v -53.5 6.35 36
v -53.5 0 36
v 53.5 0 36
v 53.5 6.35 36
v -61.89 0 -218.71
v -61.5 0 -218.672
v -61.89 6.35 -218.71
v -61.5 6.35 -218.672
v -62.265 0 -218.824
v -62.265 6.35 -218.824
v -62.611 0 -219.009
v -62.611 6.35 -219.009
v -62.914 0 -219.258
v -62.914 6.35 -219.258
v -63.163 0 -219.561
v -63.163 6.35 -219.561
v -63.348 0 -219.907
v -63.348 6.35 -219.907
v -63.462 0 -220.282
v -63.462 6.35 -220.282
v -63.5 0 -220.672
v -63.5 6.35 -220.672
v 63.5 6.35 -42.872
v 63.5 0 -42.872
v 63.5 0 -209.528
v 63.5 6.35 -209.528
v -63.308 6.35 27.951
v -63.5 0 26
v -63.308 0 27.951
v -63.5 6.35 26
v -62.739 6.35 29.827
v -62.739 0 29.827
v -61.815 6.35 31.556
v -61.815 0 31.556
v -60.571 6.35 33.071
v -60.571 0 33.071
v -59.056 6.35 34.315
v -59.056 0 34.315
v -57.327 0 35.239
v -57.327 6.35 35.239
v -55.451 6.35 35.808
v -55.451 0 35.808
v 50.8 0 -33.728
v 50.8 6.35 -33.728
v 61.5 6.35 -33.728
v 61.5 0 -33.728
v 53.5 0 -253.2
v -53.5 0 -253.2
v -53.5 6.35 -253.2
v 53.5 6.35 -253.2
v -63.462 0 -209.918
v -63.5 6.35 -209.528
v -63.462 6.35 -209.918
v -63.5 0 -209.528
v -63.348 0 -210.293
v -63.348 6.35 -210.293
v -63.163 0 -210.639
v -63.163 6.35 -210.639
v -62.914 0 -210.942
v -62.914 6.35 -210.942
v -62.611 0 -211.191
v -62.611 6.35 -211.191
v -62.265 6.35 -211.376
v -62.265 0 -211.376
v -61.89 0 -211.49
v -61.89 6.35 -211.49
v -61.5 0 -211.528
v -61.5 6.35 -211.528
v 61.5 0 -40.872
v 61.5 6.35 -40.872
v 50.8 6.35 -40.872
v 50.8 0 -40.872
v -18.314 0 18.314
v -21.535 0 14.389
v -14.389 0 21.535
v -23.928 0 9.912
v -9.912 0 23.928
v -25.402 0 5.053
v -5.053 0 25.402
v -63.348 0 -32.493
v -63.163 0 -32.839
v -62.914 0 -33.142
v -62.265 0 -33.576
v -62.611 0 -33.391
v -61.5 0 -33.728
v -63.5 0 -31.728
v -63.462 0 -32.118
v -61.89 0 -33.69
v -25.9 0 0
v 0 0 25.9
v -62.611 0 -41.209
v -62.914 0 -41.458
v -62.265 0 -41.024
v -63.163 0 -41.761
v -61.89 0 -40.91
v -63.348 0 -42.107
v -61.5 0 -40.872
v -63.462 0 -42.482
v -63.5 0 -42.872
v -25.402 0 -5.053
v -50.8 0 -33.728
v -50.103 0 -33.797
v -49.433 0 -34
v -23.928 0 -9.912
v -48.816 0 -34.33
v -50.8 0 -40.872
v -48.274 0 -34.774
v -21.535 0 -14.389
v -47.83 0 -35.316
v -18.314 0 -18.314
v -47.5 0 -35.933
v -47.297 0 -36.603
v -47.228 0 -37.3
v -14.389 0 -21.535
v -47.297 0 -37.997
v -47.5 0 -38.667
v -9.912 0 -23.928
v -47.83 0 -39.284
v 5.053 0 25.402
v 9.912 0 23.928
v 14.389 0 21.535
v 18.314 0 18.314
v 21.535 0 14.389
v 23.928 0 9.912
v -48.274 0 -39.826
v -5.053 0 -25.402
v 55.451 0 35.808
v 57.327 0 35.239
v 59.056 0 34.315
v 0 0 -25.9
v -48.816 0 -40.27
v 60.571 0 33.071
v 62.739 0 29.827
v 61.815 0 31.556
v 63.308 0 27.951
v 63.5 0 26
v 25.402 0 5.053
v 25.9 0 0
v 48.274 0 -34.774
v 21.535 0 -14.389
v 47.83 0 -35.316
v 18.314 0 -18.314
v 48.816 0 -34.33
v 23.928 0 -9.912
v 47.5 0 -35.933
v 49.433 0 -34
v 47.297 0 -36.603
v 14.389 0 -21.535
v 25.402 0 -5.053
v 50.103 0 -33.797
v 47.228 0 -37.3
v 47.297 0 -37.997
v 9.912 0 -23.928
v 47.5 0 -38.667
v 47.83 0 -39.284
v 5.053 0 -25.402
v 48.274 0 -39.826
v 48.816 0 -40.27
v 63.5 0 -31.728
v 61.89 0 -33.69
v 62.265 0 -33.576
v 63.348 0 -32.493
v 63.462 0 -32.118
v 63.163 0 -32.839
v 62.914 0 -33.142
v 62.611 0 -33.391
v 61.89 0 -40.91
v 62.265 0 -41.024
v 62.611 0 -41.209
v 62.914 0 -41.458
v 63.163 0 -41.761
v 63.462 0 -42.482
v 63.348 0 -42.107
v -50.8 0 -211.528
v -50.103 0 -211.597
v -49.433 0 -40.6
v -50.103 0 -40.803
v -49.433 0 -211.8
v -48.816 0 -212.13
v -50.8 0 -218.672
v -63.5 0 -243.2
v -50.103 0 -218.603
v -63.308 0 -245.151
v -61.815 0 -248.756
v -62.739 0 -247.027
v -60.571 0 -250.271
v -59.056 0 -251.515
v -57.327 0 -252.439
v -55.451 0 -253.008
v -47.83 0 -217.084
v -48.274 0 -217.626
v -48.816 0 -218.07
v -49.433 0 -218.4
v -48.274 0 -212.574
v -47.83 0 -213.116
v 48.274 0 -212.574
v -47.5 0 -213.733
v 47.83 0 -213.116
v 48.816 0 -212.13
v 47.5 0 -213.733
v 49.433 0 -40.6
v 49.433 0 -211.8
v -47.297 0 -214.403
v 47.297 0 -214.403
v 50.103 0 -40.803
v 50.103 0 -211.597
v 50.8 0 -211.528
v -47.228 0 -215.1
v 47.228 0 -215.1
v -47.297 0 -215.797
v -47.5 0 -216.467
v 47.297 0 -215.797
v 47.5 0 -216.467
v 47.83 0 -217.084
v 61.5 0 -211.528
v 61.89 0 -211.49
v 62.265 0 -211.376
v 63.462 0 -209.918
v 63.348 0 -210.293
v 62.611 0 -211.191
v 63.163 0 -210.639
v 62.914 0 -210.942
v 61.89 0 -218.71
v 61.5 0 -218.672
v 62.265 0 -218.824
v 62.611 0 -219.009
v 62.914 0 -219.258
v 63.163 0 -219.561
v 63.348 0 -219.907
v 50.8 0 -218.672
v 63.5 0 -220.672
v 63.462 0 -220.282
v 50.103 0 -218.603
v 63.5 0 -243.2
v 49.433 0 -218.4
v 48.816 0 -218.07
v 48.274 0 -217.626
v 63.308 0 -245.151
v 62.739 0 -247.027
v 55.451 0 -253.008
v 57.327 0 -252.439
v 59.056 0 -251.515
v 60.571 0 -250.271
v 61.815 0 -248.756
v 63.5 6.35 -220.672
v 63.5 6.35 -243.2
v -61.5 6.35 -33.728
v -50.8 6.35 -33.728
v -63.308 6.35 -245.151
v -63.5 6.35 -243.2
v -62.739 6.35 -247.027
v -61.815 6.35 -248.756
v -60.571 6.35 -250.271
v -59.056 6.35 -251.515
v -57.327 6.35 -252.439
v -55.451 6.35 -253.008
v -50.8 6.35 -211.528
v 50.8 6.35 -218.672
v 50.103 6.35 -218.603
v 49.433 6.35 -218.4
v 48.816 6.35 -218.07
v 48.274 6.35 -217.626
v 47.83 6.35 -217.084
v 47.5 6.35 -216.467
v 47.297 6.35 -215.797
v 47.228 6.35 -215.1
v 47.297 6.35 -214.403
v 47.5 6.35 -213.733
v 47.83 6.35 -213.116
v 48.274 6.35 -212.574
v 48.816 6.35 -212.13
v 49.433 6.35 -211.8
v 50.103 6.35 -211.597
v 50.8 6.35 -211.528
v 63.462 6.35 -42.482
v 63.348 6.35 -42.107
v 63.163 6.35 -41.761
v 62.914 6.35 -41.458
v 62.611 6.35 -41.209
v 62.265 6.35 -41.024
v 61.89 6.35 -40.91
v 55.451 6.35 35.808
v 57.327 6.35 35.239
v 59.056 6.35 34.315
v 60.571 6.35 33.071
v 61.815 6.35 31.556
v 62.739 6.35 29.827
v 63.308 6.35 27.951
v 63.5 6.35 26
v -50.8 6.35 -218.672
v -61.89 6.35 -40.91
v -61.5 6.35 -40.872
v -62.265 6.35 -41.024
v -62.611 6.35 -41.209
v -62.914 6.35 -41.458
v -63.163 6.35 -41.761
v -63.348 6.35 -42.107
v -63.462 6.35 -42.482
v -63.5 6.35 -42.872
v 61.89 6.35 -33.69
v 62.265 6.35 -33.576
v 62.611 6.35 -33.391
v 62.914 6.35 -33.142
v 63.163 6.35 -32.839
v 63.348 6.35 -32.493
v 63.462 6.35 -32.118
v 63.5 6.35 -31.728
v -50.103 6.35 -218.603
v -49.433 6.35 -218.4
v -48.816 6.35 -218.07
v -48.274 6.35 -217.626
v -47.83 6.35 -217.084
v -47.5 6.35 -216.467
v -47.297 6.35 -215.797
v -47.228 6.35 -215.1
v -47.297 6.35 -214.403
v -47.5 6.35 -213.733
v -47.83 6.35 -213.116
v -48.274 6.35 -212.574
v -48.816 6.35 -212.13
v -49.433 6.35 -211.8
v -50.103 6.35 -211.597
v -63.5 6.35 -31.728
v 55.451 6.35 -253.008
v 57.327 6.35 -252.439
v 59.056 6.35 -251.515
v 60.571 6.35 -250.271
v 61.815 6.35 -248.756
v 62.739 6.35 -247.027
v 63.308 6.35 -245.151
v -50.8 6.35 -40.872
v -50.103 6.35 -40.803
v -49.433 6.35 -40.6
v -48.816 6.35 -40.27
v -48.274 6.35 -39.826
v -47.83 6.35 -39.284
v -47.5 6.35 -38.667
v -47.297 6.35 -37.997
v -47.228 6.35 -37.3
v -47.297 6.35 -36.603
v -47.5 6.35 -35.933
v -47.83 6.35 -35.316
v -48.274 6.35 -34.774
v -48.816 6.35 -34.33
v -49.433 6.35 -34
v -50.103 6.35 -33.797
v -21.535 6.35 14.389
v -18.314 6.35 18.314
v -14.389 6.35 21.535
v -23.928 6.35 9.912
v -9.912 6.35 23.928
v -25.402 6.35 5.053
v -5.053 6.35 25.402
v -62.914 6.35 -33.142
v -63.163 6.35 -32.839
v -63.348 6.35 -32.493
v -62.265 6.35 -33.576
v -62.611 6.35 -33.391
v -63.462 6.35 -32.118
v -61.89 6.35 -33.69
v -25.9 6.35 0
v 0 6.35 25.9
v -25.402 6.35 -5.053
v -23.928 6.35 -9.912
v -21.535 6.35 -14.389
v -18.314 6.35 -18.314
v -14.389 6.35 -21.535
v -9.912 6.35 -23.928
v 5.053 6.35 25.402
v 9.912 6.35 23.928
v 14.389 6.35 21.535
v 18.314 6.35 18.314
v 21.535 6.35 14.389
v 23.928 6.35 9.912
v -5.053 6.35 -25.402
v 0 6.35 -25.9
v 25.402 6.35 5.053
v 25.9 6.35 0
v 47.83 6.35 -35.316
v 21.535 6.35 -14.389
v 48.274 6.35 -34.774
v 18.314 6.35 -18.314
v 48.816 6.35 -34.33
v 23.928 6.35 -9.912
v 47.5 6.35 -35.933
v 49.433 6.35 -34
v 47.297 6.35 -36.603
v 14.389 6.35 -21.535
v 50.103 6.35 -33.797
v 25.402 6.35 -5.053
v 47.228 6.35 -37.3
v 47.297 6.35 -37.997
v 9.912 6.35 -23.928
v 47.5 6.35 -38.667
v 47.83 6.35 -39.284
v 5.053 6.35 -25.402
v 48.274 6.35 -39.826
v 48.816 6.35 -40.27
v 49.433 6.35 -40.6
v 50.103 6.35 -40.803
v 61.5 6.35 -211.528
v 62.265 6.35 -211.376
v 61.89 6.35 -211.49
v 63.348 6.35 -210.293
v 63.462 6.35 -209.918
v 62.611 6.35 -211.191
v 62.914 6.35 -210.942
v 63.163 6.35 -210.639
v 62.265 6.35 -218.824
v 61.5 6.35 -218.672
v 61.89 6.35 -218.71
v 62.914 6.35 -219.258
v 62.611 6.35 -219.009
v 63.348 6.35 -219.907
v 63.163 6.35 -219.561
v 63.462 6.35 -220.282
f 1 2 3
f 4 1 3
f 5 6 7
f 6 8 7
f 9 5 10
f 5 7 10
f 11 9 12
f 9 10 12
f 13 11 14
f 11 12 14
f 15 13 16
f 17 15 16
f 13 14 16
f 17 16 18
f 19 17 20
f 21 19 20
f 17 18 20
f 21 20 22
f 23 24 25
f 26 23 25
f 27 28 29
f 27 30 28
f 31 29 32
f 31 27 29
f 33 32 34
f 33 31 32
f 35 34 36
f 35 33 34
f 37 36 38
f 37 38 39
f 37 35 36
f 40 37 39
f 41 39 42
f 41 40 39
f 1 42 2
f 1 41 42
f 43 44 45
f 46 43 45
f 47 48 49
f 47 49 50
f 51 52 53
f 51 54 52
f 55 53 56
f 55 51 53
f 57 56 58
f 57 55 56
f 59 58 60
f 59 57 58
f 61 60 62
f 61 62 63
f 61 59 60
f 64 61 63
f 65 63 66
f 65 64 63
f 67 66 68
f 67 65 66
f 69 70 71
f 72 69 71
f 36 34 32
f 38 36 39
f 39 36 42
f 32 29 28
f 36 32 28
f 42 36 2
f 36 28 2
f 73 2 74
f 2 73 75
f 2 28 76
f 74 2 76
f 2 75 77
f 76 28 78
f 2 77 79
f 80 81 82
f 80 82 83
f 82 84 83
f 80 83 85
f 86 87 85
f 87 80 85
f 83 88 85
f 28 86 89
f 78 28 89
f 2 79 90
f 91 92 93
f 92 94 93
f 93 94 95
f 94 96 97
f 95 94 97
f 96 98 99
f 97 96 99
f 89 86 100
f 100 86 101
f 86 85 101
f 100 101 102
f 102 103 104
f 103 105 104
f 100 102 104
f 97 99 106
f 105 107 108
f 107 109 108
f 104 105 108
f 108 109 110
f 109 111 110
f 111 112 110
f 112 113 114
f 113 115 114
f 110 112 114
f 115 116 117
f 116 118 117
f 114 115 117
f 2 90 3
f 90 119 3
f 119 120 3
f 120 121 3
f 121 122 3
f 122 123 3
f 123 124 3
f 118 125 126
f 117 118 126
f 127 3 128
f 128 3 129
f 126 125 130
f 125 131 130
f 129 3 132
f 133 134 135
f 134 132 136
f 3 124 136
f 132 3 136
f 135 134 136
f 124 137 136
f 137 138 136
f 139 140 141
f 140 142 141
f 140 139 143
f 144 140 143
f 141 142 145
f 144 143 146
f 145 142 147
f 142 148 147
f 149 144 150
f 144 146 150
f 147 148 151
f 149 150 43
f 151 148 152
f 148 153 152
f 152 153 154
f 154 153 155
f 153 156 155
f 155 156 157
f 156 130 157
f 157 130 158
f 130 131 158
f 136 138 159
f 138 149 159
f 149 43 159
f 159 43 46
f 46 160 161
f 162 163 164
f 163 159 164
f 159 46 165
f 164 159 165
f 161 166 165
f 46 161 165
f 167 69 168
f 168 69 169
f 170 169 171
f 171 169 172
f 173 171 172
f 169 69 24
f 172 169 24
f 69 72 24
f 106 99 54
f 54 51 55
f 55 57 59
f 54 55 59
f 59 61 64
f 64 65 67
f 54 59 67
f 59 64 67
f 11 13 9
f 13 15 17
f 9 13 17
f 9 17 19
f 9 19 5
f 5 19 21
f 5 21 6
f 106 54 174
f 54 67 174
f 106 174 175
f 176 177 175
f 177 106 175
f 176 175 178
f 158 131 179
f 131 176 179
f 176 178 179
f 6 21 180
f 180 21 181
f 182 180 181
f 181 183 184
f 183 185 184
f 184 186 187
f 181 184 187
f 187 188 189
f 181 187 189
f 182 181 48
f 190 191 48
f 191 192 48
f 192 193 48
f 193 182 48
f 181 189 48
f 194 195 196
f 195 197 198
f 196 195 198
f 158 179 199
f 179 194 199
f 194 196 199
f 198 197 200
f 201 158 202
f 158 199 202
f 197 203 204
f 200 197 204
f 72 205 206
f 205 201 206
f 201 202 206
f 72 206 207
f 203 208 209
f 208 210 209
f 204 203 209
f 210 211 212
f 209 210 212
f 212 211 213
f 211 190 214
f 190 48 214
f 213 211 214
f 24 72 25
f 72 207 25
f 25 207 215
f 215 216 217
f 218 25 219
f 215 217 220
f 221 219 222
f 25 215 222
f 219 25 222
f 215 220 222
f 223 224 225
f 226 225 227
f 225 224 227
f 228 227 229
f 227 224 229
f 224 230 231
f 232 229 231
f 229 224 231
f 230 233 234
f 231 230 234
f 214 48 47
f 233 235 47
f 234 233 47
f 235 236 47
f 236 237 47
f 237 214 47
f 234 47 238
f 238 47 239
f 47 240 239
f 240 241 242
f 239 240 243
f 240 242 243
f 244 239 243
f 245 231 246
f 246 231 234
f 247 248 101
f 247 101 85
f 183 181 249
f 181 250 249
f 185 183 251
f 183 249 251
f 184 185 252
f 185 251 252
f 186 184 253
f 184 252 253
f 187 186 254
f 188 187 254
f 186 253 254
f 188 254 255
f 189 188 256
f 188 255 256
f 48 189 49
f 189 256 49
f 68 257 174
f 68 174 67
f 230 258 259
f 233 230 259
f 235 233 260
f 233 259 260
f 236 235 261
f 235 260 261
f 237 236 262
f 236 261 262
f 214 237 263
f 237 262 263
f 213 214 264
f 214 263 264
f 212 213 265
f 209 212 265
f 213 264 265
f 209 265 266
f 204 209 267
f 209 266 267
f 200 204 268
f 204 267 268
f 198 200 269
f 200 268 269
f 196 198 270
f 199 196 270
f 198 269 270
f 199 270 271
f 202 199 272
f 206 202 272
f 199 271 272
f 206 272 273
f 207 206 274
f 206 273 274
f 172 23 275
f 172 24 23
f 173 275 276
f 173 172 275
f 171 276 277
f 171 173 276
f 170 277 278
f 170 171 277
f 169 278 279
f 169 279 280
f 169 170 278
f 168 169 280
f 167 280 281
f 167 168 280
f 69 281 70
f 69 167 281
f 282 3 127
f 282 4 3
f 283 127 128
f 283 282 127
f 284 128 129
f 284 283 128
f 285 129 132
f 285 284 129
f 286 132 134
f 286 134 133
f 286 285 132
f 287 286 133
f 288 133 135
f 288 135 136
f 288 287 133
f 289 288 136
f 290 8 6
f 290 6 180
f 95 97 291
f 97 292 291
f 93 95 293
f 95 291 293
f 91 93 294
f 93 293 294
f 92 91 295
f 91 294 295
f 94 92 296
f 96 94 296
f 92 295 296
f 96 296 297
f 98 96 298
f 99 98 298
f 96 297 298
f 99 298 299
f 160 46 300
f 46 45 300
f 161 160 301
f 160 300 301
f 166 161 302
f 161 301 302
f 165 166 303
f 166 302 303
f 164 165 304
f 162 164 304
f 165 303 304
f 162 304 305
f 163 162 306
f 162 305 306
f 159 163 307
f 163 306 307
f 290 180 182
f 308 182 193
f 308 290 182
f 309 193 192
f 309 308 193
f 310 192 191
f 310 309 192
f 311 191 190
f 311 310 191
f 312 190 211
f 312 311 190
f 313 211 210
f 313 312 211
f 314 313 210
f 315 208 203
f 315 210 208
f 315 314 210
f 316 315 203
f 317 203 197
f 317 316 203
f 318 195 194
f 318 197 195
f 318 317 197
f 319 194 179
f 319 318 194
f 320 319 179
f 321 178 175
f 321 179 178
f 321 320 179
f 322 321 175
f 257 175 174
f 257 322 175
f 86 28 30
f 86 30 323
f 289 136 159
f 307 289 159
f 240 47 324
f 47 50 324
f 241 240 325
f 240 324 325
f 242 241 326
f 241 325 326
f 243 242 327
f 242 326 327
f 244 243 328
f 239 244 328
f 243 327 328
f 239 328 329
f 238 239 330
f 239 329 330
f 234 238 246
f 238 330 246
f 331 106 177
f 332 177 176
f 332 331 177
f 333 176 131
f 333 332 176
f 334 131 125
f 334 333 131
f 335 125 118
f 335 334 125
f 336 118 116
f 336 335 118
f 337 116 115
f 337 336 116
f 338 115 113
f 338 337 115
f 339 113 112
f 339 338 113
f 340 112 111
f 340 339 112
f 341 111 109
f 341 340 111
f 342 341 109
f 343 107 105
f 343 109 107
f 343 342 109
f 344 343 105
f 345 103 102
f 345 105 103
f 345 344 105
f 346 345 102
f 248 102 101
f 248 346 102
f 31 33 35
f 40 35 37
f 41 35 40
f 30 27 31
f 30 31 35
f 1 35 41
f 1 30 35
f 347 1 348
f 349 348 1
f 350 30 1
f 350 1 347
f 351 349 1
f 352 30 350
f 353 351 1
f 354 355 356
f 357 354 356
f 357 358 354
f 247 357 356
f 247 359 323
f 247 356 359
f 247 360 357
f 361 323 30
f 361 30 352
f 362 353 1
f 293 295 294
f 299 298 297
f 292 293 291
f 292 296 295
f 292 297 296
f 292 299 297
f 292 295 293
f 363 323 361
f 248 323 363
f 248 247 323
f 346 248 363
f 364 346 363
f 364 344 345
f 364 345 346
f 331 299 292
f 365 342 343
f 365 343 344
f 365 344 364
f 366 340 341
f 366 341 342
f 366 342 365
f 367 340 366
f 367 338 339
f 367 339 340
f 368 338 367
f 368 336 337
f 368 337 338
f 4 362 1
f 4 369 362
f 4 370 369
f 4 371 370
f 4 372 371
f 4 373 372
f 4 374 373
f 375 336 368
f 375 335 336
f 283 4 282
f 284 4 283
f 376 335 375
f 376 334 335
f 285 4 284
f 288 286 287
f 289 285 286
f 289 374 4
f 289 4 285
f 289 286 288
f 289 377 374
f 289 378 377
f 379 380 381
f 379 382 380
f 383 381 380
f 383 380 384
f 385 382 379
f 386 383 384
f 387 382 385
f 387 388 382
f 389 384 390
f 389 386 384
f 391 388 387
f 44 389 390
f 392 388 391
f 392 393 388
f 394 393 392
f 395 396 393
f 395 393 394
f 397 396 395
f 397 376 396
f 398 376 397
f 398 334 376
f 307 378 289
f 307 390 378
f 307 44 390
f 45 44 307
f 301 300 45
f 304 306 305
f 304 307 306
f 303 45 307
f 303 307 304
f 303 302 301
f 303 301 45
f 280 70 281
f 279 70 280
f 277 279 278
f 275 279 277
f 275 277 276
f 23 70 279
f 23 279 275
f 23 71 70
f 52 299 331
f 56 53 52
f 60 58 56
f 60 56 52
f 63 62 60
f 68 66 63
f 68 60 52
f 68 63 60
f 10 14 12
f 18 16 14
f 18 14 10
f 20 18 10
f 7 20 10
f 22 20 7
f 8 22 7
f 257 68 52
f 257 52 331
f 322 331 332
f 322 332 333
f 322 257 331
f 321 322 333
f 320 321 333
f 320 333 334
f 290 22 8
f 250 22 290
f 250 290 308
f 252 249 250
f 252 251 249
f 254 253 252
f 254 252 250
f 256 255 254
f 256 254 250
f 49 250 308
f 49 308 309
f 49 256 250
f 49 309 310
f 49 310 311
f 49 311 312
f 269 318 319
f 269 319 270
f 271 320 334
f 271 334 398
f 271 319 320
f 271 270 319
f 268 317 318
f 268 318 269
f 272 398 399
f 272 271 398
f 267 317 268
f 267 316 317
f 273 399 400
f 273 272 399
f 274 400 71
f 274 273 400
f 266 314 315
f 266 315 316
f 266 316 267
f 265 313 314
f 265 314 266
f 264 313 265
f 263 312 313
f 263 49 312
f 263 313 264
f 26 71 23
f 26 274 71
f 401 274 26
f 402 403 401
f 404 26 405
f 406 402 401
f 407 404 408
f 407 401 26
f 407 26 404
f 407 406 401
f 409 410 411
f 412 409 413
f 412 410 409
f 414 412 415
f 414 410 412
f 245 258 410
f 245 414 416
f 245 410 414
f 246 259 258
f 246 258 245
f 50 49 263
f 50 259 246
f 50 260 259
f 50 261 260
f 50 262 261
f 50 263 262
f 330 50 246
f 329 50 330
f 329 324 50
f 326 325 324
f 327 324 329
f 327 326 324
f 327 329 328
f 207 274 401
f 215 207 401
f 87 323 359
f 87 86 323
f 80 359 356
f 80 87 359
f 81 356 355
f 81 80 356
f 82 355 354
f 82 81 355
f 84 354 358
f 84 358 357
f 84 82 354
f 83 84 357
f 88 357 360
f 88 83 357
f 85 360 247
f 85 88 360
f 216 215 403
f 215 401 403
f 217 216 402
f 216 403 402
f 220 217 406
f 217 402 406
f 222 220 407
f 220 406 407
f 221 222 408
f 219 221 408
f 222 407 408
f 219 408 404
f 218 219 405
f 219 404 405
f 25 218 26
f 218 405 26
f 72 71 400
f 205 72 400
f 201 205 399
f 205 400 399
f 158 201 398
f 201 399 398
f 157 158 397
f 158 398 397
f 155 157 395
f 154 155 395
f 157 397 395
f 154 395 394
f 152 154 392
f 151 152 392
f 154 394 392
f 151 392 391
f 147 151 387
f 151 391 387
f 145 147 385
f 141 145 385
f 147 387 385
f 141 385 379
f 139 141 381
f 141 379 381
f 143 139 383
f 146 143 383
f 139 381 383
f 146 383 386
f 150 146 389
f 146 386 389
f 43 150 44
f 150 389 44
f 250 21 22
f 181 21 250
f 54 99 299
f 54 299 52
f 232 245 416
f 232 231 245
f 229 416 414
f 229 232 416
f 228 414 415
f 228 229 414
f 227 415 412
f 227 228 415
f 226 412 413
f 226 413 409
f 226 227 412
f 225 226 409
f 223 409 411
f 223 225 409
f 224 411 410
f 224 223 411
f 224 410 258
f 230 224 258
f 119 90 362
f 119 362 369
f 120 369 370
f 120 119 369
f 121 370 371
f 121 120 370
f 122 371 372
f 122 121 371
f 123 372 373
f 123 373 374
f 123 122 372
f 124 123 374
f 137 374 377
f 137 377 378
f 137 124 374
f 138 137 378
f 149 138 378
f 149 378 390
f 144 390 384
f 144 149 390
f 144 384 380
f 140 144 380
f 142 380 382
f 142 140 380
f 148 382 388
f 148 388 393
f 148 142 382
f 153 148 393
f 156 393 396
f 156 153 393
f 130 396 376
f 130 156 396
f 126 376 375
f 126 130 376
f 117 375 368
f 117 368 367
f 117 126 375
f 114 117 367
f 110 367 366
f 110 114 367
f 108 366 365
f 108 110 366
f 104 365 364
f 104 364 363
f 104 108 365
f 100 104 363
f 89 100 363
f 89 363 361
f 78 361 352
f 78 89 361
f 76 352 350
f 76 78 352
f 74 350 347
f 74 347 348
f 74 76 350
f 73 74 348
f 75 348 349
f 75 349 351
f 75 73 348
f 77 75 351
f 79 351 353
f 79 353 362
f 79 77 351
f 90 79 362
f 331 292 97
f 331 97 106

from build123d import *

# Parameters (mm, degrees)
SKETCH1_W           = 127
SKETCH1_H           = 289.2
SKETCH1_R           = 25.9
BOSS_EXTRUDE1_DEPTH = 6.35
CUT_EXTRUDE1_DEPTH  = 7.35
FILLET1_R           = 2
FILLET2_R           = 10


with BuildPart() as part:
    # Sketch1 → Boss-Extrude1 (new body)
    with BuildSketch(Plane(origin=(0, 0, 0), x_dir=(1, 0, 0), z_dir=(0, 1, 0))):
        with Locations((0, 108.6)):
            Rectangle(SKETCH1_W, SKETCH1_H)
        with Locations(Location((0, 0, 0), (0, 0, 270))):  # turned: the seam where the file's is
            Circle(SKETCH1_R, mode=Mode.SUBTRACT)
    extrude(amount=BOSS_EXTRUDE1_DEPTH)

    # Sketch3 → Cut-Extrude1 (cut, through all)
    with BuildSketch(Plane(origin=(0, 6.35, 0), x_dir=(1, 0, 0), z_dir=(0, 1, 0))):
        with BuildLine():
            Line((-76.2, 218.671875), (-50.8, 218.671875))
            ThreePointArc((-50.8, 218.671875), (-47.228125, 215.1), (-50.8, 211.528125))
            Line((-50.8, 211.528125), (-76.2, 211.528125))
            ThreePointArc((-76.2, 211.528125), (-79.771875, 215.1), (-76.2, 218.671875))
        make_face()
        with BuildLine():
            Line((-76.2, 40.871875), (-50.8, 40.871875))
            ThreePointArc((-50.8, 40.871875), (-47.228125, 37.3), (-50.8, 33.728125))
            Line((-50.8, 33.728125), (-76.2, 33.728125))
            ThreePointArc((-76.2, 33.728125), (-79.771875, 37.3), (-76.2, 40.871875))
        make_face()
    cut_extrude1 = extrude(amount=-CUT_EXTRUDE1_DEPTH, mode=Mode.SUBTRACT)

    # Mirror1: Cut-Extrude1 across plane
    add(cut_extrude1.mirror(Plane(origin=(0, 0, 0), x_dir=(0, 0, 1), z_dir=(1, 0, 0))), mode=Mode.SUBTRACT)

    # Fillet1
    fillet1_edges = [part.edges().sort_by_distance(p)[0] for p in [
        (-63.5, 3.175, -211.528125),
        (-63.5, 3.175, -218.671875),
        (-63.5, 3.175, -40.871875),
        (-63.5, 3.175, -33.728125),
        (63.5, 3.175, -218.671875),
        (63.5, 3.175, -211.528125),
        (63.5, 3.175, -33.728125),
        (63.5, 3.175, -40.871875),
    ]]
    fillet(fillet1_edges, radius=FILLET1_R)

    # Fillet2
    fillet2_edges = [part.edges().sort_by_distance(p)[0] for p in [
        (-63.5, 3.175, -253.2),
        (63.5, 3.175, -253.2),
        (63.5, 3.175, 36),
        (-63.5, 3.175, 36),
    ]]
    fillet(fillet2_edges, radius=FILLET2_R)


solid = part.part
